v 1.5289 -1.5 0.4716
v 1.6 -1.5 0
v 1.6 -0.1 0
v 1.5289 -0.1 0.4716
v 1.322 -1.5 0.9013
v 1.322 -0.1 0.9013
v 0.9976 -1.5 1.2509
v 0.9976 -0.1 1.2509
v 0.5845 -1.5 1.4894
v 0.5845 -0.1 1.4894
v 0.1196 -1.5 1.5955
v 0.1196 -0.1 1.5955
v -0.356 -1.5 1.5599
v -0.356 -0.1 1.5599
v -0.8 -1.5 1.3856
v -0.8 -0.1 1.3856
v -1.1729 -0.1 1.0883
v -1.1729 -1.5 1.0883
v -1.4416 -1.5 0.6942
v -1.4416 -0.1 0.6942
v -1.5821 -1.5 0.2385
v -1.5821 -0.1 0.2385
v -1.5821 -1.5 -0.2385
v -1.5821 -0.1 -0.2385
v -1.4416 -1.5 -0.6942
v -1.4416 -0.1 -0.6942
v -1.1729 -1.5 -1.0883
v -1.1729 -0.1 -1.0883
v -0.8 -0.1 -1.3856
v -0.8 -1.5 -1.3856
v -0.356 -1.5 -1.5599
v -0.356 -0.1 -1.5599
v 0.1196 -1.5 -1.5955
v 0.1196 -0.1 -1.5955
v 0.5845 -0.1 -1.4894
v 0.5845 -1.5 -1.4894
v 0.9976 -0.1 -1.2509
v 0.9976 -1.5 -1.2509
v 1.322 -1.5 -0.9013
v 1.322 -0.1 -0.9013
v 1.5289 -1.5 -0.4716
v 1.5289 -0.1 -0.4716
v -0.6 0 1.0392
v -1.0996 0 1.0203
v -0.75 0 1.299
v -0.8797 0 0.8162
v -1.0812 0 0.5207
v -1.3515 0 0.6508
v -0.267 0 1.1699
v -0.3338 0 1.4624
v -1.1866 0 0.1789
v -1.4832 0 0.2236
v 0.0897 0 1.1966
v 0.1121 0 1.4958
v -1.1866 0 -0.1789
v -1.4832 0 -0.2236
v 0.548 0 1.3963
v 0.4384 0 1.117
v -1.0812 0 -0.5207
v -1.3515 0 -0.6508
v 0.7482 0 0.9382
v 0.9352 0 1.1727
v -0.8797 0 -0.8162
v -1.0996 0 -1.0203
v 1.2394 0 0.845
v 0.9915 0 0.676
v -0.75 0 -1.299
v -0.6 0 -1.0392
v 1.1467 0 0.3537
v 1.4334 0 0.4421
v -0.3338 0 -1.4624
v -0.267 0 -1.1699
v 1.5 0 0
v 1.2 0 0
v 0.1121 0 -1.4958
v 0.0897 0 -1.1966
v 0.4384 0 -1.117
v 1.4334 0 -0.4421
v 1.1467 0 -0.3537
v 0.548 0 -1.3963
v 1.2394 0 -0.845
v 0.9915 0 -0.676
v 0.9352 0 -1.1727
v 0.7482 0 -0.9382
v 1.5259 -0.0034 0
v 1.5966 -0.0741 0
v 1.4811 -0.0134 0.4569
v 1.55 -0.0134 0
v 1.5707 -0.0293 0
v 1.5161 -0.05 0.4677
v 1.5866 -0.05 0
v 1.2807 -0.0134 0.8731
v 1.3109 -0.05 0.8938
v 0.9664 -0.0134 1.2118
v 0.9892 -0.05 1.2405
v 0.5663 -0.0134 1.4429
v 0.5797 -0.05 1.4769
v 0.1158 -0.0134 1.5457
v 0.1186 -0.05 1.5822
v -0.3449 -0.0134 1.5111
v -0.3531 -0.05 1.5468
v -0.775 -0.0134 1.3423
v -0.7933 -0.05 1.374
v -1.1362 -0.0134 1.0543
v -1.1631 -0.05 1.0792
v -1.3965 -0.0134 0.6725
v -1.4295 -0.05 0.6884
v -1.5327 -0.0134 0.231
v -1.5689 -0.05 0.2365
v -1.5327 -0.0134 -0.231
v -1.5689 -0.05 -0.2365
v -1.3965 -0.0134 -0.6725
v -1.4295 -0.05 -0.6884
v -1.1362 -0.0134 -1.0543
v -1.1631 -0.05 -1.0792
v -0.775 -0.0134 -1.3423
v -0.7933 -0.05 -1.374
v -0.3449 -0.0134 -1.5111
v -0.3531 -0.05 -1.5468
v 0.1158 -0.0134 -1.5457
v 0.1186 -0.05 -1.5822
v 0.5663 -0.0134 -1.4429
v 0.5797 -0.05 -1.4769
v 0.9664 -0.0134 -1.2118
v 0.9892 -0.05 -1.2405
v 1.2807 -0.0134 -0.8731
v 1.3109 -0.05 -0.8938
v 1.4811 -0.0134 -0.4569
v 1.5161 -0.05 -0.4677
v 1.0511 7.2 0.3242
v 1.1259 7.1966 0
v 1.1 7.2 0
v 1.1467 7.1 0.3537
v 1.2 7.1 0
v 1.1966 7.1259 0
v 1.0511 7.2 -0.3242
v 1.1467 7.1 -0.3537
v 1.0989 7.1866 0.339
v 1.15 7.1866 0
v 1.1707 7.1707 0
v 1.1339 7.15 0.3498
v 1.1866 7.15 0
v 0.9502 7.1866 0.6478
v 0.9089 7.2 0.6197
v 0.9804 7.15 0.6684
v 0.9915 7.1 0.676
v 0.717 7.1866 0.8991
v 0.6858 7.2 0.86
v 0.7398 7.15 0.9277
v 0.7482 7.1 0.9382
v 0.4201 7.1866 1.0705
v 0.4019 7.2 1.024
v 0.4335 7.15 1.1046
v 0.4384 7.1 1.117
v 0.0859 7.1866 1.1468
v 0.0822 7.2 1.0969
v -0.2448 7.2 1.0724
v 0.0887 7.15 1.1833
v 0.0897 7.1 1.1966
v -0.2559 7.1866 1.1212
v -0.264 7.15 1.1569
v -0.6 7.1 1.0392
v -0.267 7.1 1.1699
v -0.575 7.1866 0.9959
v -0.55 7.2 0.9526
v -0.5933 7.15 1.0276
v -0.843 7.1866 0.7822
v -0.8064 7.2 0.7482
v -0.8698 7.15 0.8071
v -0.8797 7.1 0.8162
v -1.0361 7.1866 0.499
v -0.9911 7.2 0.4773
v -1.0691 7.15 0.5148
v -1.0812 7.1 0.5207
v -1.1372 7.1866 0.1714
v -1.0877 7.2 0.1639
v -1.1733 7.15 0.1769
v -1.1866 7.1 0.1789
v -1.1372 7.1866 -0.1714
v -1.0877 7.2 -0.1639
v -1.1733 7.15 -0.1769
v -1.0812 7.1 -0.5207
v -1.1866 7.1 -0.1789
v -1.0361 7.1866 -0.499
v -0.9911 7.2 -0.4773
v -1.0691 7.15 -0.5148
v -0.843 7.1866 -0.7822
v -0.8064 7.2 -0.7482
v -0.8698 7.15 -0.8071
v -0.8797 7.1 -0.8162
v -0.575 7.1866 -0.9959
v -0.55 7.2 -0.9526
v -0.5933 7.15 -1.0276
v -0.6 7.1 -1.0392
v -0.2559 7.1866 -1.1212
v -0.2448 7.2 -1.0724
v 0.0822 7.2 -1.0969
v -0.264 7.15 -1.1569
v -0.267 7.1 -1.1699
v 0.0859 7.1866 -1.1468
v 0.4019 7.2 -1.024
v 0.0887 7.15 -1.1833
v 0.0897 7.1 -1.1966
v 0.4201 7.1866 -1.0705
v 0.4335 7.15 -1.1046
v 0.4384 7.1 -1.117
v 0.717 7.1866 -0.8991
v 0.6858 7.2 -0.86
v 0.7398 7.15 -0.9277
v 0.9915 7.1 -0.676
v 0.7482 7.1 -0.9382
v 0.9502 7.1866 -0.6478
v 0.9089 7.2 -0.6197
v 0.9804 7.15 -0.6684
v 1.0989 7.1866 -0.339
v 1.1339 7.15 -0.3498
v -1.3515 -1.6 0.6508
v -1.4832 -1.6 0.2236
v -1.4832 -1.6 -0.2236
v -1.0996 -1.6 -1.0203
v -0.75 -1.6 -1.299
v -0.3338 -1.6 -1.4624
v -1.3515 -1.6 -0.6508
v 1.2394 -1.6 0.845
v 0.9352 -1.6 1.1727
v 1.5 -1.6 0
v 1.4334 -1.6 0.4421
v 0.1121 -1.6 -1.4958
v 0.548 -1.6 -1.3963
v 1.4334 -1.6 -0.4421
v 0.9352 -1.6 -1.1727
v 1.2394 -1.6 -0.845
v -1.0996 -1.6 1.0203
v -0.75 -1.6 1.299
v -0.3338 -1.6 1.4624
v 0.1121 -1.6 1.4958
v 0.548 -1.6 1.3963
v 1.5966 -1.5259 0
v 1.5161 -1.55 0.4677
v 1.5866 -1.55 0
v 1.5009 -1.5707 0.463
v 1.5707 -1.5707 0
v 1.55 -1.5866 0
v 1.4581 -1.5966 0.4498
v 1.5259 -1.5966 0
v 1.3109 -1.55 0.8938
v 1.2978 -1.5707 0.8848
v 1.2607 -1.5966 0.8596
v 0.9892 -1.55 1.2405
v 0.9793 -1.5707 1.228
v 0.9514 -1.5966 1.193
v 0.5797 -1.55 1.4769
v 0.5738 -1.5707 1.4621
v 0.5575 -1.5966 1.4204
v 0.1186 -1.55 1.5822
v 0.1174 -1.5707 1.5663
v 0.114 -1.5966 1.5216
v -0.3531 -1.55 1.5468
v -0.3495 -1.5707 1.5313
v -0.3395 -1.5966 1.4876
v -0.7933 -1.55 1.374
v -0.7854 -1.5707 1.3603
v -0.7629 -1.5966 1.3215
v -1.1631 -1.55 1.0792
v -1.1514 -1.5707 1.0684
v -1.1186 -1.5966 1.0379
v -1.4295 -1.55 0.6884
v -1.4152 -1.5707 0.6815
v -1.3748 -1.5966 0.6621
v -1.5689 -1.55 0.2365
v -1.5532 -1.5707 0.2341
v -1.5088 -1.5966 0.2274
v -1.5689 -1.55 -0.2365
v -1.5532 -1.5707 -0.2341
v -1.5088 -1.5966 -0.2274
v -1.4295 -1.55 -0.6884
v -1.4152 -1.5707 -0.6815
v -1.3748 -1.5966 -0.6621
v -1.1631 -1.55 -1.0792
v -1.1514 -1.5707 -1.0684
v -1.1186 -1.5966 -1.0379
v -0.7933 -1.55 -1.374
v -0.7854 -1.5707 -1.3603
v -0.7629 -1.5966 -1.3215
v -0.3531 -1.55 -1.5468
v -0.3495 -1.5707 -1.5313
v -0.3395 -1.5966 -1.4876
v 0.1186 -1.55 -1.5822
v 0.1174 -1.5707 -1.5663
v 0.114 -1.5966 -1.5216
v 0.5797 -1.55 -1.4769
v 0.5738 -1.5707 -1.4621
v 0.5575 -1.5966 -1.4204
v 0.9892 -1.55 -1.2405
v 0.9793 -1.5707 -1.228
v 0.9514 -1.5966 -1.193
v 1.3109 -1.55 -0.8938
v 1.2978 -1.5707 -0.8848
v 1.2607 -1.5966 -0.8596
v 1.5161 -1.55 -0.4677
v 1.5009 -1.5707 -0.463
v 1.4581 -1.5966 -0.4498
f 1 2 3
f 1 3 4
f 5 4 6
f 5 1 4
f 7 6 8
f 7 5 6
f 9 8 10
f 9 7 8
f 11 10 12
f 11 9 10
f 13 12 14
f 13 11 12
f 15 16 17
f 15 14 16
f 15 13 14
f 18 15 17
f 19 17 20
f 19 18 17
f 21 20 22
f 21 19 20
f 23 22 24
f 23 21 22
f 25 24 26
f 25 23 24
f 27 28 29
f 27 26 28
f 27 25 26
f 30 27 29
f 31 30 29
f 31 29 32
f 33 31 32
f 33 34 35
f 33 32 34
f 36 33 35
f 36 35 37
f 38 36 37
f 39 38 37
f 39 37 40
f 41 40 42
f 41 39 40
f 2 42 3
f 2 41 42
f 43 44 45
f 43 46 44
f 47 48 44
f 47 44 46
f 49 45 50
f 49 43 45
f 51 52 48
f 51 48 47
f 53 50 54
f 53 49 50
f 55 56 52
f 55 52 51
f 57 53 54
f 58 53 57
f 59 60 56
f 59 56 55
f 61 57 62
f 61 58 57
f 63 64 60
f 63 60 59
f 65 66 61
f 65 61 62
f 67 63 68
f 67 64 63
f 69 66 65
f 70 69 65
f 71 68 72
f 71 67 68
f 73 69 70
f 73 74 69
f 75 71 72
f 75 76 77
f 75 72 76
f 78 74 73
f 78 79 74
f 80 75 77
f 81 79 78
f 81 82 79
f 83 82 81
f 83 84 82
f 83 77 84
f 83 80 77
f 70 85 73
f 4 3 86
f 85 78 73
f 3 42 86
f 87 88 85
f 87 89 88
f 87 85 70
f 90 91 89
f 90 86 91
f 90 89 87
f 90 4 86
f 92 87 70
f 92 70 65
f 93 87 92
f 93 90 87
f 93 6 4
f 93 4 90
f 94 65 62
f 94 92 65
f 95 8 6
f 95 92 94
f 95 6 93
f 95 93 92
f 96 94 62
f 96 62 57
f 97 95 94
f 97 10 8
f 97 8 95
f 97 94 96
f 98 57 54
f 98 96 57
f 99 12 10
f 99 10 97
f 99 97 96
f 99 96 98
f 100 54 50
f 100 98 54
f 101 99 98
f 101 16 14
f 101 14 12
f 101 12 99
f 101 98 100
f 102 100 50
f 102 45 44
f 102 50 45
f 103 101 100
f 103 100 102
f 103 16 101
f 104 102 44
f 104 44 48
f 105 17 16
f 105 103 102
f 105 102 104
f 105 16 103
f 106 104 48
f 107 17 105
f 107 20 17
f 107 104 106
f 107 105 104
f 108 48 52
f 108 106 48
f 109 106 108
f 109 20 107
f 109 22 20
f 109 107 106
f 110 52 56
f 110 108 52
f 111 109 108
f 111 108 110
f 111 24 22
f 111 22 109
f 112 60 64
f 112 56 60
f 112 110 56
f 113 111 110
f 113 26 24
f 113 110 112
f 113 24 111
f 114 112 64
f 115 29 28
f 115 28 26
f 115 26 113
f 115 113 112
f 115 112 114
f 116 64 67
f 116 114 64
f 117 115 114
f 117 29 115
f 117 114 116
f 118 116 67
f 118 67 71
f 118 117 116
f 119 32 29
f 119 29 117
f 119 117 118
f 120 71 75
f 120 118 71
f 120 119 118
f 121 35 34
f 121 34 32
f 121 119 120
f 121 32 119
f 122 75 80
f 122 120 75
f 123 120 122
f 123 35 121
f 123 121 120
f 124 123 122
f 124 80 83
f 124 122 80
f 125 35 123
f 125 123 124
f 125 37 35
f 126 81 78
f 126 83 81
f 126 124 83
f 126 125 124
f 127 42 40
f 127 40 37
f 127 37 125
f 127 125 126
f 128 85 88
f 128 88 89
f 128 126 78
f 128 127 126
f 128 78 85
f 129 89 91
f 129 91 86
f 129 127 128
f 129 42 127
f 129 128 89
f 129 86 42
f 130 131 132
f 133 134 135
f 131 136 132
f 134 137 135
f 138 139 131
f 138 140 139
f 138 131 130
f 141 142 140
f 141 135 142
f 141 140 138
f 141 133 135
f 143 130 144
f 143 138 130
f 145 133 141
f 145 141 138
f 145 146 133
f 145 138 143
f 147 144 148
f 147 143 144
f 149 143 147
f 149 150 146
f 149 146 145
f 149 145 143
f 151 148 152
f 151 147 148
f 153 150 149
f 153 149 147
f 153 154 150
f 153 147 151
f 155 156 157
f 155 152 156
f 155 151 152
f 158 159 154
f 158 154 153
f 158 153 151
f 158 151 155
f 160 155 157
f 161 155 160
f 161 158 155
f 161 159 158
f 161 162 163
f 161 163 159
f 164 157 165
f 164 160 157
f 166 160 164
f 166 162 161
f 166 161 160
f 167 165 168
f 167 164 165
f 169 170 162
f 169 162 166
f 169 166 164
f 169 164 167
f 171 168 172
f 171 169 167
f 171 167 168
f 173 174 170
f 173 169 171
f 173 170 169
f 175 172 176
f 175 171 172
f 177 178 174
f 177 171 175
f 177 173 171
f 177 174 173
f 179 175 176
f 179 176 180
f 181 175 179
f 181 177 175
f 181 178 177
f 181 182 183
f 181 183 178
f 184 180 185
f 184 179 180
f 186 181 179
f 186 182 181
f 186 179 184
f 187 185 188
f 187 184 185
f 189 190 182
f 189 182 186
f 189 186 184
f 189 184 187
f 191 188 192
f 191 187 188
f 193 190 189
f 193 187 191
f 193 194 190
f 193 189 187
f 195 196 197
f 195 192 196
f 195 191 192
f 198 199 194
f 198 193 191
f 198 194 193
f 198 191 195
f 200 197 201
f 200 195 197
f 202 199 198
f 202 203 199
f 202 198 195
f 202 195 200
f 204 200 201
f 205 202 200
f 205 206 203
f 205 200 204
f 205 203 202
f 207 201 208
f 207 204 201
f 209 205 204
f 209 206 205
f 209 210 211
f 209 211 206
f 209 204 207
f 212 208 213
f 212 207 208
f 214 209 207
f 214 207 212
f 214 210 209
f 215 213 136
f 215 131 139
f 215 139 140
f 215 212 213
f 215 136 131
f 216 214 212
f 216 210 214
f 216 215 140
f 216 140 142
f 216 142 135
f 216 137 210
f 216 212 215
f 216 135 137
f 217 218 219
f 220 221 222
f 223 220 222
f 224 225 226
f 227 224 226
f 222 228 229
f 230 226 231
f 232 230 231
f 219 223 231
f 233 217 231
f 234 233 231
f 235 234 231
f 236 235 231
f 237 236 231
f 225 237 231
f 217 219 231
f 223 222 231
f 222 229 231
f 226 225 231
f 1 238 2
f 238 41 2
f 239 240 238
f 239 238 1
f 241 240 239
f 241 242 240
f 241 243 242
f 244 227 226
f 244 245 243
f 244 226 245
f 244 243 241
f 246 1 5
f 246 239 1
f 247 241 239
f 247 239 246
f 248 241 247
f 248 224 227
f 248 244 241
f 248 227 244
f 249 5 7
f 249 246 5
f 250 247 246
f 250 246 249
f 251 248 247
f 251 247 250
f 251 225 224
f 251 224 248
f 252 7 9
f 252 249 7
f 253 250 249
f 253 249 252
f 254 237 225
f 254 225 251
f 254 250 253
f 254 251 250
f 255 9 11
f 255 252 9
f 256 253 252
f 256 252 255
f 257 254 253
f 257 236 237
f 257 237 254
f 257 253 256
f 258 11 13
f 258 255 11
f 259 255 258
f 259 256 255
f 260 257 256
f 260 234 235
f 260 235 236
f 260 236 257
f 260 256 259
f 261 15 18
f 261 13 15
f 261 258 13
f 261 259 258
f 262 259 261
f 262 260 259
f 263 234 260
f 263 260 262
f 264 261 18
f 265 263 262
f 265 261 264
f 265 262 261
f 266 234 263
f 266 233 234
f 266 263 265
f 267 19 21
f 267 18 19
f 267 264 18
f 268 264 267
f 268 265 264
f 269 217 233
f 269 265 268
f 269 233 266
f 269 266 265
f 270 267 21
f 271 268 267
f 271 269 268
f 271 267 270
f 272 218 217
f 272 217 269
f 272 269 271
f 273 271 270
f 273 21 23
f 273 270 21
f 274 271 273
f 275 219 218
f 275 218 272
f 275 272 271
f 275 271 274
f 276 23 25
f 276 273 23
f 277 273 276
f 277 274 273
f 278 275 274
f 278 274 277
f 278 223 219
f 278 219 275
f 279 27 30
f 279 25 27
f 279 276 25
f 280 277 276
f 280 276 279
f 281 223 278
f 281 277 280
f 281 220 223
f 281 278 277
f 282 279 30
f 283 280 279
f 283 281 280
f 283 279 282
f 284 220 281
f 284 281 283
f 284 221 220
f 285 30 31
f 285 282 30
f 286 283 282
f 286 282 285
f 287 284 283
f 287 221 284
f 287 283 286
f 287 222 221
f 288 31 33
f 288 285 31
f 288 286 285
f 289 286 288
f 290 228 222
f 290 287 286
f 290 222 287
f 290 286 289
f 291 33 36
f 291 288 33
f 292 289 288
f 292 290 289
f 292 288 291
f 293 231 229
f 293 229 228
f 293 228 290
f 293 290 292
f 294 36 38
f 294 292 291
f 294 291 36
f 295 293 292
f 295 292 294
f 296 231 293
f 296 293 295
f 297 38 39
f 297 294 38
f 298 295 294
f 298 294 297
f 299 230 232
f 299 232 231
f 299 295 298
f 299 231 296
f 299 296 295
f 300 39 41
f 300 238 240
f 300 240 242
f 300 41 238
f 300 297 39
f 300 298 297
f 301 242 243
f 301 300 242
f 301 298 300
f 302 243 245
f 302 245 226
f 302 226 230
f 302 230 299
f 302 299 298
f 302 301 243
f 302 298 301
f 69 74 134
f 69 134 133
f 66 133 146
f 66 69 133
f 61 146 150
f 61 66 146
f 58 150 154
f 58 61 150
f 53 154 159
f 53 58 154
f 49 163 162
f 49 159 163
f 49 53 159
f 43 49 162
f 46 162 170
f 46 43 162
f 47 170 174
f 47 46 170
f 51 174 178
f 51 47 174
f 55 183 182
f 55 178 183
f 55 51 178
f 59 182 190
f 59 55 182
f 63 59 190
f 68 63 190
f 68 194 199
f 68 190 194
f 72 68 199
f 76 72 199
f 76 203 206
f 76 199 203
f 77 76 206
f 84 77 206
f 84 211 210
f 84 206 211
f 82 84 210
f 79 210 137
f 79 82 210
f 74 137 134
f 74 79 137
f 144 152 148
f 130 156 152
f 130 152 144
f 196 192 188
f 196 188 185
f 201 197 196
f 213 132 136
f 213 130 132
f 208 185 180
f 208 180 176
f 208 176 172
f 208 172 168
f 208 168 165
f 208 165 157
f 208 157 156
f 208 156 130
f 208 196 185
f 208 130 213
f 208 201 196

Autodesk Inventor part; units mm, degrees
ref_plane "YZ Plane" through (0, 0, 0) normal (1, 0, 0) x (0, 1, 0)
ref_plane "XZ Plane" through (0, 0, 0) normal (0, 1, 0) x (-1, 0, 0)
ref_plane "XY Plane" through (0, 0, 0) normal (0, 0, 1) x (1, 0, 0)
sketch "Sketch2" plane through (0, 0, 0) normal (0, 0, 1) x (1, 0, 0)
  line L0 (1.2, 0) -> (1.6, 0)
  line L1 (1.6, 0) -> (1.6, -1.6)
  line L2 (1.6, -1.6) -> (0, -1.6)
  line L3 (0, -1.6) -> (0, 7.2)
  line L4 (0, 7.2) -> (1.2, 7.2)
  line L5 (1.2, 7.2) -> (1.2, 0)
  point P0 (0, 0)
  dimension "d0" = 3.2
  dimension "d1" = 2.4
  dimension "d2" = 1.6
  dimension "d3" = 7.2
revolve "Revolution1" add sketch "Sketch2" angle 360 about axis through (0, -1.6, 0) along (0, 1, 0)
fillet "Fillet1" radius 0.1 3 edges at (-1.2, 7.2, 0) (-1.6, 0, 0) (-1.6, -1.6, 0)
properties part number "u9208" material "Steel"
